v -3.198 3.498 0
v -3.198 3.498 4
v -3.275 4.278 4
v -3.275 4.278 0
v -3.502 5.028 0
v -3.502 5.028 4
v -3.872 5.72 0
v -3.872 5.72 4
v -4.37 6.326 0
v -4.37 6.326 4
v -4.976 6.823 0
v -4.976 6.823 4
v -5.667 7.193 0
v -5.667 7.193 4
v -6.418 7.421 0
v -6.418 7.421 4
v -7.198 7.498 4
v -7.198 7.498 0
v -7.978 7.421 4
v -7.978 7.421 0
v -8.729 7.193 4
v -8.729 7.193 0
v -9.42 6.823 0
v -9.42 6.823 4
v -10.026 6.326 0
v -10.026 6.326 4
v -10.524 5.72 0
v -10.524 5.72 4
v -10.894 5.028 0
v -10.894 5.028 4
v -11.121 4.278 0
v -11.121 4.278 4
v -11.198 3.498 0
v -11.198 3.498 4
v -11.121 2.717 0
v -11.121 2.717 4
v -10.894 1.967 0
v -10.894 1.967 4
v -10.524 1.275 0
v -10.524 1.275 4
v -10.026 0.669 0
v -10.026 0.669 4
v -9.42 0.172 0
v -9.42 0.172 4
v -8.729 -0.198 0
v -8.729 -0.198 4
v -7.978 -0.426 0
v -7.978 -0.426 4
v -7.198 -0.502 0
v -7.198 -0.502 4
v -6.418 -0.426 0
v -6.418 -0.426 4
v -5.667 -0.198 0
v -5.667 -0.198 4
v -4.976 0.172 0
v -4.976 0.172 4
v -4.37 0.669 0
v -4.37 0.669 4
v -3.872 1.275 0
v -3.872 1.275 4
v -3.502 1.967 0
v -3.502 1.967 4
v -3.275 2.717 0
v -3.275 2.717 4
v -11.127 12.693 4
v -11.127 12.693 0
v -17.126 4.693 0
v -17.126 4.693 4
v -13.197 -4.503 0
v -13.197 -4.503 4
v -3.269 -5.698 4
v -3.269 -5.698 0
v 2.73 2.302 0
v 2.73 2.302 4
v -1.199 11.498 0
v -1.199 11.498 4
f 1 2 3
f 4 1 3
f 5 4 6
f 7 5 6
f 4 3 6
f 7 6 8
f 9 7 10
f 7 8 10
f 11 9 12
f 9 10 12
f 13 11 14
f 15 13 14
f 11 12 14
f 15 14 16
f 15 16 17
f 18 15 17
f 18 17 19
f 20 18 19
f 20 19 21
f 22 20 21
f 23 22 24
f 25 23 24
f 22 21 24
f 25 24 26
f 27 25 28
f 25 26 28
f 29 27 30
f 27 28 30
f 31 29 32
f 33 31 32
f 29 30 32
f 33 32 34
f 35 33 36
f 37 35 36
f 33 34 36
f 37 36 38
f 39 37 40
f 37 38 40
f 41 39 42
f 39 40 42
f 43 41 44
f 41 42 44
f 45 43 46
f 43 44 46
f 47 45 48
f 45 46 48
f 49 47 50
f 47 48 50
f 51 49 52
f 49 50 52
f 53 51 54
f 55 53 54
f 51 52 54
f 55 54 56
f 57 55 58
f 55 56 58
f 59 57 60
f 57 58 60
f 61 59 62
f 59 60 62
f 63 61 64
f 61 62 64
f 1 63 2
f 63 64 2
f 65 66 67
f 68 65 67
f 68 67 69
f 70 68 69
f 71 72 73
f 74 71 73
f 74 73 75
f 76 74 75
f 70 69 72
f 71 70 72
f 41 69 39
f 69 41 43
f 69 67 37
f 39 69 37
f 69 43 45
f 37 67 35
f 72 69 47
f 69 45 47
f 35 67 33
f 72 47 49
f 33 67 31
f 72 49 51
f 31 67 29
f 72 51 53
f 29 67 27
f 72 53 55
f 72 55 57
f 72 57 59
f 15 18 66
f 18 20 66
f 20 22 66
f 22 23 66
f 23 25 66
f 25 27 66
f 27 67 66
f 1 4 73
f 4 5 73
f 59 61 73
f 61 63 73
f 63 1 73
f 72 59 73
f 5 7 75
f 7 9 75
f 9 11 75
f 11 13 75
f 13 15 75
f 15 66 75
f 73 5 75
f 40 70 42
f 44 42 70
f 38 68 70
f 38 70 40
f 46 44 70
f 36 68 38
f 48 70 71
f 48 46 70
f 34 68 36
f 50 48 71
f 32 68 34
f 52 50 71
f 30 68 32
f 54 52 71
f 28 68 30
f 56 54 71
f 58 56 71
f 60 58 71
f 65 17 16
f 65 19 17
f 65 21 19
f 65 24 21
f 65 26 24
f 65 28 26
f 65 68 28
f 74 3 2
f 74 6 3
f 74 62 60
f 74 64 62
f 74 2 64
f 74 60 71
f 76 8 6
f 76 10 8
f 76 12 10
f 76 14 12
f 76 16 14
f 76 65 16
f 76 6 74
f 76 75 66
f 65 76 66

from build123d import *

# Parameters (mm, degrees)
BOSS_EXTRUDE1_DEPTH = 4
SKETCH2_R           = 4
CUT_EXTRUDE1_DEPTH  = 4


with BuildPart() as part:
    # Sketch1 → Boss-Extrude1 (new body)
    with BuildSketch(Plane.XY):
        Polygon((2.730304444, 2.302220599), (-1.198694049, 11.498033279), (-11.127000685, 12.693327112), (-17.126308828, 4.692808266), (-13.197310334, -4.503004414), (-3.269003699, -5.698298248), align=None)
    extrude(amount=BOSS_EXTRUDE1_DEPTH)

    # Sketch2 → Cut-Extrude1 (cut)
    with BuildSketch(Plane.XY.offset(4)):
        with Locations((-7.198002192, 3.497514432)):
            Circle(SKETCH2_R)
    extrude(amount=-CUT_EXTRUDE1_DEPTH, mode=Mode.SUBTRACT)


solid = part.part
